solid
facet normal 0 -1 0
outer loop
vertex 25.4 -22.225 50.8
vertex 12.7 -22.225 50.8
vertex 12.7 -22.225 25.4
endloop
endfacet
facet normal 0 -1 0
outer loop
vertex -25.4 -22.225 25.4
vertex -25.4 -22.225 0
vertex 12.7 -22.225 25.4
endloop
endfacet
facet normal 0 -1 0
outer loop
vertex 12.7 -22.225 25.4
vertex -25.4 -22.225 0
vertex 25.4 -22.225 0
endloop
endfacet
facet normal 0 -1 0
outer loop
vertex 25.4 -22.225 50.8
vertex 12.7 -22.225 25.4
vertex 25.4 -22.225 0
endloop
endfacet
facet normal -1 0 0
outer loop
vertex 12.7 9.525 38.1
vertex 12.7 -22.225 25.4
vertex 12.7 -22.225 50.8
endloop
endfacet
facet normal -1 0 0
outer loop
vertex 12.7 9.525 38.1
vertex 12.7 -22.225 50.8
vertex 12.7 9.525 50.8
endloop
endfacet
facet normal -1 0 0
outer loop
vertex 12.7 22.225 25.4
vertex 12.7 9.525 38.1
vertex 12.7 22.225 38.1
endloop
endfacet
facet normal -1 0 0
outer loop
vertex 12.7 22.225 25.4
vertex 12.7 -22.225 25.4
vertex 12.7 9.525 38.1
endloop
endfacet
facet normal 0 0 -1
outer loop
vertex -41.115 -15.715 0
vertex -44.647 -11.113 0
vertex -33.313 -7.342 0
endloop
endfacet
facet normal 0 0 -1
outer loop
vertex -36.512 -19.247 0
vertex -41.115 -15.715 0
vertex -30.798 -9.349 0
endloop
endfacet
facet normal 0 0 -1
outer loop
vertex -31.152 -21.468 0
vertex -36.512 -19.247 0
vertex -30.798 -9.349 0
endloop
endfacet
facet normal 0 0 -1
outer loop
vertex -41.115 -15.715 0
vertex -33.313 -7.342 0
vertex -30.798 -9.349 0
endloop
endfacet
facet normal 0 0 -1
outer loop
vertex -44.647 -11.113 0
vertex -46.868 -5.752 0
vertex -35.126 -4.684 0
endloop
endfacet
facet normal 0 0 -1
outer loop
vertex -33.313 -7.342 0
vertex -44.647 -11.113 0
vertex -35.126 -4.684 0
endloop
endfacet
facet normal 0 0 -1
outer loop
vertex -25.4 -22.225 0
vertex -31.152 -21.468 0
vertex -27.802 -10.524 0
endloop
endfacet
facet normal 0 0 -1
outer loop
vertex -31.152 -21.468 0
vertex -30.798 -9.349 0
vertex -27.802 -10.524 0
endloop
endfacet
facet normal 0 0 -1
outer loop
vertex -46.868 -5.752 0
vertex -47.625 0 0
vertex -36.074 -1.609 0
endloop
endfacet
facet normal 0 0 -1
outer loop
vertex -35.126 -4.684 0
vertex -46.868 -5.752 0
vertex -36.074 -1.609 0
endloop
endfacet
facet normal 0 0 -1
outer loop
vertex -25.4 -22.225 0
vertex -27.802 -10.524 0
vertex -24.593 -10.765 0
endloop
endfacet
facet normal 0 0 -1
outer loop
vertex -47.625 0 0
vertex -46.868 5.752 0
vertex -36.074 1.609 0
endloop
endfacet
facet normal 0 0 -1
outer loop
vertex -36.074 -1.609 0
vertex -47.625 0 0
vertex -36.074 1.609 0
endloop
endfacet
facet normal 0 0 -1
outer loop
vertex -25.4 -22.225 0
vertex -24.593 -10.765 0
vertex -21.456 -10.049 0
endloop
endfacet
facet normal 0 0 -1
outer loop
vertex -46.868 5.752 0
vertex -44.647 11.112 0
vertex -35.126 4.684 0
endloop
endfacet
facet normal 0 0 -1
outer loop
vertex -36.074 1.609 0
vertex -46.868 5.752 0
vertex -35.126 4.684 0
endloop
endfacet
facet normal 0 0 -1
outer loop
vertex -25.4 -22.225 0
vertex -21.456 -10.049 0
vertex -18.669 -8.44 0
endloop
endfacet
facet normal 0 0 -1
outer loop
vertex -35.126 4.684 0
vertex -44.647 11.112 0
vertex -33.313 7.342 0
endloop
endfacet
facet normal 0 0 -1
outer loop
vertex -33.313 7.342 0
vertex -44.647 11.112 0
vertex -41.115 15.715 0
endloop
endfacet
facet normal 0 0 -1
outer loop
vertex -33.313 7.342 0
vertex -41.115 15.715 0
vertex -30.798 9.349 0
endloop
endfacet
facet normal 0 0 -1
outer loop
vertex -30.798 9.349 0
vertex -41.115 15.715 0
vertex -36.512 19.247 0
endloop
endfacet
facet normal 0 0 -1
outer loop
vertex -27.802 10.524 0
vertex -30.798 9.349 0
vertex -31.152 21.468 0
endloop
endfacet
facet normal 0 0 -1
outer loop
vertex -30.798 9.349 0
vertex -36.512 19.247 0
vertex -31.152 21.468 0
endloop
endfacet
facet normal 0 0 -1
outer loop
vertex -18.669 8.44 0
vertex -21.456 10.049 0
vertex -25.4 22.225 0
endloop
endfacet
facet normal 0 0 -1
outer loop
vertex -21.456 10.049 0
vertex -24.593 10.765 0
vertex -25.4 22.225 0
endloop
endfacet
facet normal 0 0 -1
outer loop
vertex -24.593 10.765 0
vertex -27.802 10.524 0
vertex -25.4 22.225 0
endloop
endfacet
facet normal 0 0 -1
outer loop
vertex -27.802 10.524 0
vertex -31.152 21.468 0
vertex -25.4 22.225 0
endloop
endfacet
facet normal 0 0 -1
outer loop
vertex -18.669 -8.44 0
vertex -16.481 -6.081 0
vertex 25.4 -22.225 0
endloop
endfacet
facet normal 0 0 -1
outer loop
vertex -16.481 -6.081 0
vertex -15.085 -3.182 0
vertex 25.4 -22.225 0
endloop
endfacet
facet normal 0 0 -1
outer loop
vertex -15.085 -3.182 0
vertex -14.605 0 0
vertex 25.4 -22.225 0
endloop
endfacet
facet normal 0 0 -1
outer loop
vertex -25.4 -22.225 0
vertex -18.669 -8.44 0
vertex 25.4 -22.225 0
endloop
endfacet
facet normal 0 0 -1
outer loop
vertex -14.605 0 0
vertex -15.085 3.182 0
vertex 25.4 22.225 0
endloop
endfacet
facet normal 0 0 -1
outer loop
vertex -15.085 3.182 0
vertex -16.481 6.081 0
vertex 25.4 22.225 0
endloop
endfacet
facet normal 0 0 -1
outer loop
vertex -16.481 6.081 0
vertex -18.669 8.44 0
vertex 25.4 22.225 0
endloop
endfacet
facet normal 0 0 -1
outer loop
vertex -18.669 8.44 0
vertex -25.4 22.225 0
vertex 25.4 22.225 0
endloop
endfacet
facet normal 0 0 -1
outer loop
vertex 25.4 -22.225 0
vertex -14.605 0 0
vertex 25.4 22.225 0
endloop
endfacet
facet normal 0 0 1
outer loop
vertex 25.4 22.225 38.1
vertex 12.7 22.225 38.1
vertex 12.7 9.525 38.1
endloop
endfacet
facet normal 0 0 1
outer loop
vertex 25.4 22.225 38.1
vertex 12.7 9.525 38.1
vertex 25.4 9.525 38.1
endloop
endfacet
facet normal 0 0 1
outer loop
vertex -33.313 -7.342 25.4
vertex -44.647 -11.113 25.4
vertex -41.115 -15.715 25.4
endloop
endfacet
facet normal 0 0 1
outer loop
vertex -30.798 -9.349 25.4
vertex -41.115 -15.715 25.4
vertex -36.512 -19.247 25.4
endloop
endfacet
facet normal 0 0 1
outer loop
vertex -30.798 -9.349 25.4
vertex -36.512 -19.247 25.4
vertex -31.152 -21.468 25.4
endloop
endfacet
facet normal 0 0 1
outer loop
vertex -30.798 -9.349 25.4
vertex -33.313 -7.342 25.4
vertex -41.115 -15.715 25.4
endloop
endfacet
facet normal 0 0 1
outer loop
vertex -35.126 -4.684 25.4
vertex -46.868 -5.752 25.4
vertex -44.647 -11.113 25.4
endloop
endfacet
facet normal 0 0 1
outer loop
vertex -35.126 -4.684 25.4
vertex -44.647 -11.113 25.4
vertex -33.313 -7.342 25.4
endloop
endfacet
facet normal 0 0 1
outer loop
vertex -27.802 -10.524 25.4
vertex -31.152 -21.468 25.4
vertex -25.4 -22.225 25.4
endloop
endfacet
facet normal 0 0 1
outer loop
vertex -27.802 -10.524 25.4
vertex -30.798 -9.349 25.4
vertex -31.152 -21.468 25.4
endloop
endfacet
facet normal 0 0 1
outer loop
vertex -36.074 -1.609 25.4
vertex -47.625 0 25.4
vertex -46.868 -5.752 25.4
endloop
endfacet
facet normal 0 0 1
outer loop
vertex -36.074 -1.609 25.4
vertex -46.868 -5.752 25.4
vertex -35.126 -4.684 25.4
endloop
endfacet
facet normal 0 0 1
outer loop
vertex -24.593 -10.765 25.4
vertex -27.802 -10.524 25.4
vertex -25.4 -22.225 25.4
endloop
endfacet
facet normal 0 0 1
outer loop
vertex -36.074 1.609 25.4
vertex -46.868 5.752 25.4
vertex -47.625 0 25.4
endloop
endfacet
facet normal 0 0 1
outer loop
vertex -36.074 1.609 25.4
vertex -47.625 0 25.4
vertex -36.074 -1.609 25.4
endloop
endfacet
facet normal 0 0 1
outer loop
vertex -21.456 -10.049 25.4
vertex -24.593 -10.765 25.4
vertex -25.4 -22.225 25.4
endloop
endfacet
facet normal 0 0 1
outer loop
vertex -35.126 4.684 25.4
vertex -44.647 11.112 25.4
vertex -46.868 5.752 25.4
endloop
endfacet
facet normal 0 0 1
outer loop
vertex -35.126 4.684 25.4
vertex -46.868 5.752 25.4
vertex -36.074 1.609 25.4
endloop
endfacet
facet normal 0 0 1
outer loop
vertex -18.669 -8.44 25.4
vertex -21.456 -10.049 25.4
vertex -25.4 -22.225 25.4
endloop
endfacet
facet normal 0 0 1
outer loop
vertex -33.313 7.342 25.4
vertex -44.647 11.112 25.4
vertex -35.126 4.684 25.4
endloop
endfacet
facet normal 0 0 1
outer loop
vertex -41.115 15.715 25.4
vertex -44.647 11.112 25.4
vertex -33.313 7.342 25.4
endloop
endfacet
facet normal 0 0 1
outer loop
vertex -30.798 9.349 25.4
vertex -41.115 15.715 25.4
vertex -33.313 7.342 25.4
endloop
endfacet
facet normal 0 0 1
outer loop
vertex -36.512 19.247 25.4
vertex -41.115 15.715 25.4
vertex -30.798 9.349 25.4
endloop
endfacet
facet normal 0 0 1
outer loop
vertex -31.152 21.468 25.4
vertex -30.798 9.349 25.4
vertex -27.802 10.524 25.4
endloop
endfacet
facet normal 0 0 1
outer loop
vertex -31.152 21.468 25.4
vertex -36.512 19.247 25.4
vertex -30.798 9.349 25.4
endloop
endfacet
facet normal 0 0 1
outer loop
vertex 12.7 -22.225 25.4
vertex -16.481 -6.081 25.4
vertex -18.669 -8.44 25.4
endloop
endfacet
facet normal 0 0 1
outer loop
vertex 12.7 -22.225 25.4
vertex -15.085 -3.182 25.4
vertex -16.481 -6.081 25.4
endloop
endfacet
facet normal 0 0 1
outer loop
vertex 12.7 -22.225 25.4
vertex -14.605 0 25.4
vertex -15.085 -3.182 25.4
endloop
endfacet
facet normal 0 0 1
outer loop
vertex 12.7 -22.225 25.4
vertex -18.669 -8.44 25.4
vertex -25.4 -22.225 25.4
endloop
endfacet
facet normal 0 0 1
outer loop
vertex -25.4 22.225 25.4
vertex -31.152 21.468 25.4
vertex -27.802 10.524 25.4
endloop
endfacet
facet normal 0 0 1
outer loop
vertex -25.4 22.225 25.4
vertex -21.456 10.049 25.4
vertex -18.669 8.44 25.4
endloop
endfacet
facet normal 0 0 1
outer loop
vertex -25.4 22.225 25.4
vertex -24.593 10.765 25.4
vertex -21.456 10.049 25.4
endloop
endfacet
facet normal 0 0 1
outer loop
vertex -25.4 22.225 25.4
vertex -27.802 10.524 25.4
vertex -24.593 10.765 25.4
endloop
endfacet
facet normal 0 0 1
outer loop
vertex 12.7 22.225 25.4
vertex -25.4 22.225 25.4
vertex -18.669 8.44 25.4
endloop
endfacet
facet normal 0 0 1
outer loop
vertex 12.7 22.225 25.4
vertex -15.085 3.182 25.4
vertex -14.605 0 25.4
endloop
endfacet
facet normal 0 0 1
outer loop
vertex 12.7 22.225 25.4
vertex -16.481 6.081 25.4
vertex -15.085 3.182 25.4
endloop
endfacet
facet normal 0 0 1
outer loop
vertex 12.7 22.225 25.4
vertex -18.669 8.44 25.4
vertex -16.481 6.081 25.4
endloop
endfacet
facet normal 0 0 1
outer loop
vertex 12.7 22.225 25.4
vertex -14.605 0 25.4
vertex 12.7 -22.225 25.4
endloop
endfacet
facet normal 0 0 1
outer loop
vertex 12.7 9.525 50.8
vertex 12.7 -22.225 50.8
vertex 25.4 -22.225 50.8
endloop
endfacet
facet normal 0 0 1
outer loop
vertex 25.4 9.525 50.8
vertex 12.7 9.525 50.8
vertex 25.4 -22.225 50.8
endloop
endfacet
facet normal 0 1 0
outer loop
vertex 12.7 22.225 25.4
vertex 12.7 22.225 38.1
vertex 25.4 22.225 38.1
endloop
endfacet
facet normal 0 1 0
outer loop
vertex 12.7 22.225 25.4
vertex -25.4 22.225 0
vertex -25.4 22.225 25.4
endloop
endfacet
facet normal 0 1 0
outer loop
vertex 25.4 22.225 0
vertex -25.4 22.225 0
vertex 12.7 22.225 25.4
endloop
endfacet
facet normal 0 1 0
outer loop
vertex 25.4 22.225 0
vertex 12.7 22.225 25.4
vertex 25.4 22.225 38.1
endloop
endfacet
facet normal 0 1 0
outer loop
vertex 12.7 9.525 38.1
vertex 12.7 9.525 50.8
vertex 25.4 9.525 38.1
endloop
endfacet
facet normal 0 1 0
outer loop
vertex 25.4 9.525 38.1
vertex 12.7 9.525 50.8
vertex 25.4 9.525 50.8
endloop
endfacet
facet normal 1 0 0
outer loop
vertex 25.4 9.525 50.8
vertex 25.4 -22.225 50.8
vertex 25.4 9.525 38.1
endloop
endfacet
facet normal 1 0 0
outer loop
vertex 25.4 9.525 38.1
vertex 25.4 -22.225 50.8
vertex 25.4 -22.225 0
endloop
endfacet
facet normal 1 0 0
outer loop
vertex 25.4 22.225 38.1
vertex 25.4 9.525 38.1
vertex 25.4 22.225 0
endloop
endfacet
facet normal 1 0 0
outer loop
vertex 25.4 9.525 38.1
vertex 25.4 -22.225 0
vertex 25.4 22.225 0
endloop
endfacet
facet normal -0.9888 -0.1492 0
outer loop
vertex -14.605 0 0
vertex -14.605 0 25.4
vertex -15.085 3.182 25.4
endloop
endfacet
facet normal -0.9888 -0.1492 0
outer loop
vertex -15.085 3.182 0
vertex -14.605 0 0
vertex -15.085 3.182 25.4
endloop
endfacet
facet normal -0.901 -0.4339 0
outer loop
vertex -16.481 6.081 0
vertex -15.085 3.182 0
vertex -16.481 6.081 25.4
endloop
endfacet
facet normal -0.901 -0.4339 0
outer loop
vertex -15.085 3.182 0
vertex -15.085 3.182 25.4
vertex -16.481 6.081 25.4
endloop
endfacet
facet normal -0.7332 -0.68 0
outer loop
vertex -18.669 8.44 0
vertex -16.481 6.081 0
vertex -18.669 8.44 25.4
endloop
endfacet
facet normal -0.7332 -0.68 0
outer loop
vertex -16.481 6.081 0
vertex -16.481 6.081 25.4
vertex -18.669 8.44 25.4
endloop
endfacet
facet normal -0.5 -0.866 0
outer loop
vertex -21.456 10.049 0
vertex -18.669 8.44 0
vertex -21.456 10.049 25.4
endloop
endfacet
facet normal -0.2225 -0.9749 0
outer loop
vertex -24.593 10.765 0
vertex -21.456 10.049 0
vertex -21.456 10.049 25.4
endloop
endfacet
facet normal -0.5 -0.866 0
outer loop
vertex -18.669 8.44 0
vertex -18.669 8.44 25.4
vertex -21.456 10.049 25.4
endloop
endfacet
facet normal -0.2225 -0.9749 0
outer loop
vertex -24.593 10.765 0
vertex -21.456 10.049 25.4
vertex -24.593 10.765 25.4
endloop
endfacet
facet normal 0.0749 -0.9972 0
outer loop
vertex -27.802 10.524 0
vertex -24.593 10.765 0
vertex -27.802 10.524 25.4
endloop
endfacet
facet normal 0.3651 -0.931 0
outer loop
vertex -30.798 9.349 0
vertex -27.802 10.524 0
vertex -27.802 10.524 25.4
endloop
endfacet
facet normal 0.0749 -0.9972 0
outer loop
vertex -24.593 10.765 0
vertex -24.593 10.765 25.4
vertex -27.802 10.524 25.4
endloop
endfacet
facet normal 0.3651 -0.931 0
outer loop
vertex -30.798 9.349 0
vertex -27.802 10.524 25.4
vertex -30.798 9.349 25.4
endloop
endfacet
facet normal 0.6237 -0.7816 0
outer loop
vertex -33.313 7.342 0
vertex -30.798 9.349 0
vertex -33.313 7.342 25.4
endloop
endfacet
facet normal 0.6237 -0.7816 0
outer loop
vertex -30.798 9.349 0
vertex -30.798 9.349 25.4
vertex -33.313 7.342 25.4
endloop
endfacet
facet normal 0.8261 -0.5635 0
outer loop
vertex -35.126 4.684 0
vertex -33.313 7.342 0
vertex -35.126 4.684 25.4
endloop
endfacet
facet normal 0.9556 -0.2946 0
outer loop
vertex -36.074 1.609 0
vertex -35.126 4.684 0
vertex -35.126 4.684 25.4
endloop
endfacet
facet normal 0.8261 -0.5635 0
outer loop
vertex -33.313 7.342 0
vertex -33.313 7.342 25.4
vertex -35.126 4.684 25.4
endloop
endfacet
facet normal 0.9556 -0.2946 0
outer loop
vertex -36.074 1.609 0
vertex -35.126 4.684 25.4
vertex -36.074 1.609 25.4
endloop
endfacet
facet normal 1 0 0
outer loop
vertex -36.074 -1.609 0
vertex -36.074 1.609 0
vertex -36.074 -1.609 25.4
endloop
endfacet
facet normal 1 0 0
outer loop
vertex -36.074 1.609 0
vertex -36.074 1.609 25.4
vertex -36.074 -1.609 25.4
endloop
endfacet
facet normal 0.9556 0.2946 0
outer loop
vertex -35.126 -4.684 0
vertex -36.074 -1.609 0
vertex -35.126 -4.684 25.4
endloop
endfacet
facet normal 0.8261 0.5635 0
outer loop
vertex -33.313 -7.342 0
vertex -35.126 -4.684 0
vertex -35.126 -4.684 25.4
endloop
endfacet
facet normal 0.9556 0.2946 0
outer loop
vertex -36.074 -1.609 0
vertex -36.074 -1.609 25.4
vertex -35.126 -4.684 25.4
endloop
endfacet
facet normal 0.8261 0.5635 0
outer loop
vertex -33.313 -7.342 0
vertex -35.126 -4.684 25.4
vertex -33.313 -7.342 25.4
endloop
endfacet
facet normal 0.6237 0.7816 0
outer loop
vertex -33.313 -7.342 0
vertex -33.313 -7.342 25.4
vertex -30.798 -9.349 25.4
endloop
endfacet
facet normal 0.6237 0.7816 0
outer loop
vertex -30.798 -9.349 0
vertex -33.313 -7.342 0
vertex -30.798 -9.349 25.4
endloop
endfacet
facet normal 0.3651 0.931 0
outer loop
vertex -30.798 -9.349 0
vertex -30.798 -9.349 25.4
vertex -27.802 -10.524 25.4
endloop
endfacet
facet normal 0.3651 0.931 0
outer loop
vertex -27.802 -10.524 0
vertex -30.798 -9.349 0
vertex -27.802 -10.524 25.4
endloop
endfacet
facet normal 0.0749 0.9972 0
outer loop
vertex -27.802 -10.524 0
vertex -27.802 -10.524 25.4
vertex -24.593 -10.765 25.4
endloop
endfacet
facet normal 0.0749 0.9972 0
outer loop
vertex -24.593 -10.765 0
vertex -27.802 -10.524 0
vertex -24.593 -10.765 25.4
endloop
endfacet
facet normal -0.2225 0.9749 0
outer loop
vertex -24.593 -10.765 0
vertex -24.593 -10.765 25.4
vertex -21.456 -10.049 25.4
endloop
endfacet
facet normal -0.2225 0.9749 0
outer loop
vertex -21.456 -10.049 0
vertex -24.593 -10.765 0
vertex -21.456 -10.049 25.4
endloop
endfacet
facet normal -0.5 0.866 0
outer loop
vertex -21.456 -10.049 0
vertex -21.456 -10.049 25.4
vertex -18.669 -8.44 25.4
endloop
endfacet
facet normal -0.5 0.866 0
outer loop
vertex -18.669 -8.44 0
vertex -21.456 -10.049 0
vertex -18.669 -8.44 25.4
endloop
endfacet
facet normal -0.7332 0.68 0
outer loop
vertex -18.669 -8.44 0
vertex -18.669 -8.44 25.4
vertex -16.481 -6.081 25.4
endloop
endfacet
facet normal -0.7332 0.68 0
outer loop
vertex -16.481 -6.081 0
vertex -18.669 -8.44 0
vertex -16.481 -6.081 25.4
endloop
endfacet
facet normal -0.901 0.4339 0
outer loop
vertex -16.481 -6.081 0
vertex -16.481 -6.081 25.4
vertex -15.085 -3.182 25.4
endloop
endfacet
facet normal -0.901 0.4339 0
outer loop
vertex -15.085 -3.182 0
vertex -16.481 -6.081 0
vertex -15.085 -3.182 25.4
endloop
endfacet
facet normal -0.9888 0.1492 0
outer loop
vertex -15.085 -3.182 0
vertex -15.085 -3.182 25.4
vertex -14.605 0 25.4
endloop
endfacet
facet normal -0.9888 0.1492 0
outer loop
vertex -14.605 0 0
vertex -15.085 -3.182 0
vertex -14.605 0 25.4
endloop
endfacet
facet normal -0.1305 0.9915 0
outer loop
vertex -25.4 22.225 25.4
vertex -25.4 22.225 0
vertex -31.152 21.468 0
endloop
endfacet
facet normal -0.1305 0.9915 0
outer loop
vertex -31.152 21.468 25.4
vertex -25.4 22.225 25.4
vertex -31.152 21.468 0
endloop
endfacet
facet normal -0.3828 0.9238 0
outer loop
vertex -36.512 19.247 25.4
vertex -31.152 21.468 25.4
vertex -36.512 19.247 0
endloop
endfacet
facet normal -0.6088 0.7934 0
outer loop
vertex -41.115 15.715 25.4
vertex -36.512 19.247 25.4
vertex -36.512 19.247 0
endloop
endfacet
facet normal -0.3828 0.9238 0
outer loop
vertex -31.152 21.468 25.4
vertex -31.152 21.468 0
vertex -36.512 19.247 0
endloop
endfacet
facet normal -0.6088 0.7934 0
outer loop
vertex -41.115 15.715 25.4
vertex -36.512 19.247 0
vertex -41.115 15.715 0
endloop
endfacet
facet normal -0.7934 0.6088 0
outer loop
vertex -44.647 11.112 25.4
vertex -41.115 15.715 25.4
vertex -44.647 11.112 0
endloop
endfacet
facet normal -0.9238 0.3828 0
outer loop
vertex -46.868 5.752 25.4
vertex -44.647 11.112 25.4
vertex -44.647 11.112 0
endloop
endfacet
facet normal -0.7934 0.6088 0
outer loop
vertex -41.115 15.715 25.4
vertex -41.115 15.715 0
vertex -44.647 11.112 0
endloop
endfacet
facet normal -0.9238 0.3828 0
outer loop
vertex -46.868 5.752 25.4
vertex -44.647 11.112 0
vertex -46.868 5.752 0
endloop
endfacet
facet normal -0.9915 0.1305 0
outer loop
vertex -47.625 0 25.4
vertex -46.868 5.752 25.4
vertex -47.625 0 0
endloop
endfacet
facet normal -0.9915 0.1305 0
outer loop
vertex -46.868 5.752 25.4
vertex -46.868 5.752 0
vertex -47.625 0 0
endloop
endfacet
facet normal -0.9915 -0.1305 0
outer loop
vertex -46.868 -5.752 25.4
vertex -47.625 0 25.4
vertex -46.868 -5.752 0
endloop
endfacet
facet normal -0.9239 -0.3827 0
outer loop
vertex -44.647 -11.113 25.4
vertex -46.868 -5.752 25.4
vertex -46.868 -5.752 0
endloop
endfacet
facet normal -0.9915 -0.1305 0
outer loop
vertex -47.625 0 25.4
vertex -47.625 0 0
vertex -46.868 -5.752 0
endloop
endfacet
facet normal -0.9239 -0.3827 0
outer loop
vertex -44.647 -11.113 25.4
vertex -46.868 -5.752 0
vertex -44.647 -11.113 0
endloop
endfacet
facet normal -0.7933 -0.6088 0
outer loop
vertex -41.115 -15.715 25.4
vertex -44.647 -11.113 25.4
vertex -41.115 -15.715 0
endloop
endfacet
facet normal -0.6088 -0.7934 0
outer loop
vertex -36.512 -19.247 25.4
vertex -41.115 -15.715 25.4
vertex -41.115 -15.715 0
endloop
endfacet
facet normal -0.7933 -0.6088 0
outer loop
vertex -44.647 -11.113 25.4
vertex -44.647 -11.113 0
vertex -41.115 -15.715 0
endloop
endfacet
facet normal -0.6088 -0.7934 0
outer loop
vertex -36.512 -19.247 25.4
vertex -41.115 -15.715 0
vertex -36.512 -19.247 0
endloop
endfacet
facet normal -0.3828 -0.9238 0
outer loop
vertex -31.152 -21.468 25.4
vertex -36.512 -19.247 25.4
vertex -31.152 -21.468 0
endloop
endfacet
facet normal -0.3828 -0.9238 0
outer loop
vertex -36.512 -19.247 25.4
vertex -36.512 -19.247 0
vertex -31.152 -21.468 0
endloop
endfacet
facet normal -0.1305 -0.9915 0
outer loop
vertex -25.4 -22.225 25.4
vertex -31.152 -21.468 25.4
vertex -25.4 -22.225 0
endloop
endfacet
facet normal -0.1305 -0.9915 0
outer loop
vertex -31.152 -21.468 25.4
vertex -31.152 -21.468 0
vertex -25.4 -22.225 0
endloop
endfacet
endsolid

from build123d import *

# Parameters (mm, degrees)
F0_W     = 50.8
F0_H     = 44.45
F1_DEPTH = 25.4
F2_R     = 22.225
F3_DEPTH = 25.4
F4_R     = 10.795
F5_DEPTH = 25.401
F6_W     = 12.7
F6_H     = 44.45
F7_DEPTH = 25.4
F8_W     = 12.7
F8_H     = 12.7
F9_DEPTH = 12.7


with BuildPart() as f1:
    # F0 (on Top) → F1 (new body)
    with BuildSketch(Plane.XY):
        Rectangle(F0_W, F0_H)
    extrude(amount=F1_DEPTH)

    # F2 (on Top) → F3 (join)
    with BuildSketch(Plane.XY):
        with Locations((-25.4, 0)):
            Circle(F2_R)
    extrude(amount=F3_DEPTH)

    # F4 (on face) → F5 (cut, through all)
    with BuildSketch(Plane.XY.offset(25.4)):
        with Locations((-25.4, 0)):
            Circle(F4_R)
    extrude(amount=-F5_DEPTH, mode=Mode.SUBTRACT)

    # F6 (on face) → F7 (join)
    with BuildSketch(Plane.XY.offset(25.4)):
        with Locations((19.05, 0)):
            Rectangle(F6_W, F6_H)
    extrude(amount=F7_DEPTH)

    # F8 (on face) → F9 (cut)
    with BuildSketch(Plane.XY.offset(50.8)):
        with Locations((19.05, 15.875)):
            Rectangle(F8_W, F8_H)
    extrude(amount=-F9_DEPTH, mode=Mode.SUBTRACT)


solid = f1.part
